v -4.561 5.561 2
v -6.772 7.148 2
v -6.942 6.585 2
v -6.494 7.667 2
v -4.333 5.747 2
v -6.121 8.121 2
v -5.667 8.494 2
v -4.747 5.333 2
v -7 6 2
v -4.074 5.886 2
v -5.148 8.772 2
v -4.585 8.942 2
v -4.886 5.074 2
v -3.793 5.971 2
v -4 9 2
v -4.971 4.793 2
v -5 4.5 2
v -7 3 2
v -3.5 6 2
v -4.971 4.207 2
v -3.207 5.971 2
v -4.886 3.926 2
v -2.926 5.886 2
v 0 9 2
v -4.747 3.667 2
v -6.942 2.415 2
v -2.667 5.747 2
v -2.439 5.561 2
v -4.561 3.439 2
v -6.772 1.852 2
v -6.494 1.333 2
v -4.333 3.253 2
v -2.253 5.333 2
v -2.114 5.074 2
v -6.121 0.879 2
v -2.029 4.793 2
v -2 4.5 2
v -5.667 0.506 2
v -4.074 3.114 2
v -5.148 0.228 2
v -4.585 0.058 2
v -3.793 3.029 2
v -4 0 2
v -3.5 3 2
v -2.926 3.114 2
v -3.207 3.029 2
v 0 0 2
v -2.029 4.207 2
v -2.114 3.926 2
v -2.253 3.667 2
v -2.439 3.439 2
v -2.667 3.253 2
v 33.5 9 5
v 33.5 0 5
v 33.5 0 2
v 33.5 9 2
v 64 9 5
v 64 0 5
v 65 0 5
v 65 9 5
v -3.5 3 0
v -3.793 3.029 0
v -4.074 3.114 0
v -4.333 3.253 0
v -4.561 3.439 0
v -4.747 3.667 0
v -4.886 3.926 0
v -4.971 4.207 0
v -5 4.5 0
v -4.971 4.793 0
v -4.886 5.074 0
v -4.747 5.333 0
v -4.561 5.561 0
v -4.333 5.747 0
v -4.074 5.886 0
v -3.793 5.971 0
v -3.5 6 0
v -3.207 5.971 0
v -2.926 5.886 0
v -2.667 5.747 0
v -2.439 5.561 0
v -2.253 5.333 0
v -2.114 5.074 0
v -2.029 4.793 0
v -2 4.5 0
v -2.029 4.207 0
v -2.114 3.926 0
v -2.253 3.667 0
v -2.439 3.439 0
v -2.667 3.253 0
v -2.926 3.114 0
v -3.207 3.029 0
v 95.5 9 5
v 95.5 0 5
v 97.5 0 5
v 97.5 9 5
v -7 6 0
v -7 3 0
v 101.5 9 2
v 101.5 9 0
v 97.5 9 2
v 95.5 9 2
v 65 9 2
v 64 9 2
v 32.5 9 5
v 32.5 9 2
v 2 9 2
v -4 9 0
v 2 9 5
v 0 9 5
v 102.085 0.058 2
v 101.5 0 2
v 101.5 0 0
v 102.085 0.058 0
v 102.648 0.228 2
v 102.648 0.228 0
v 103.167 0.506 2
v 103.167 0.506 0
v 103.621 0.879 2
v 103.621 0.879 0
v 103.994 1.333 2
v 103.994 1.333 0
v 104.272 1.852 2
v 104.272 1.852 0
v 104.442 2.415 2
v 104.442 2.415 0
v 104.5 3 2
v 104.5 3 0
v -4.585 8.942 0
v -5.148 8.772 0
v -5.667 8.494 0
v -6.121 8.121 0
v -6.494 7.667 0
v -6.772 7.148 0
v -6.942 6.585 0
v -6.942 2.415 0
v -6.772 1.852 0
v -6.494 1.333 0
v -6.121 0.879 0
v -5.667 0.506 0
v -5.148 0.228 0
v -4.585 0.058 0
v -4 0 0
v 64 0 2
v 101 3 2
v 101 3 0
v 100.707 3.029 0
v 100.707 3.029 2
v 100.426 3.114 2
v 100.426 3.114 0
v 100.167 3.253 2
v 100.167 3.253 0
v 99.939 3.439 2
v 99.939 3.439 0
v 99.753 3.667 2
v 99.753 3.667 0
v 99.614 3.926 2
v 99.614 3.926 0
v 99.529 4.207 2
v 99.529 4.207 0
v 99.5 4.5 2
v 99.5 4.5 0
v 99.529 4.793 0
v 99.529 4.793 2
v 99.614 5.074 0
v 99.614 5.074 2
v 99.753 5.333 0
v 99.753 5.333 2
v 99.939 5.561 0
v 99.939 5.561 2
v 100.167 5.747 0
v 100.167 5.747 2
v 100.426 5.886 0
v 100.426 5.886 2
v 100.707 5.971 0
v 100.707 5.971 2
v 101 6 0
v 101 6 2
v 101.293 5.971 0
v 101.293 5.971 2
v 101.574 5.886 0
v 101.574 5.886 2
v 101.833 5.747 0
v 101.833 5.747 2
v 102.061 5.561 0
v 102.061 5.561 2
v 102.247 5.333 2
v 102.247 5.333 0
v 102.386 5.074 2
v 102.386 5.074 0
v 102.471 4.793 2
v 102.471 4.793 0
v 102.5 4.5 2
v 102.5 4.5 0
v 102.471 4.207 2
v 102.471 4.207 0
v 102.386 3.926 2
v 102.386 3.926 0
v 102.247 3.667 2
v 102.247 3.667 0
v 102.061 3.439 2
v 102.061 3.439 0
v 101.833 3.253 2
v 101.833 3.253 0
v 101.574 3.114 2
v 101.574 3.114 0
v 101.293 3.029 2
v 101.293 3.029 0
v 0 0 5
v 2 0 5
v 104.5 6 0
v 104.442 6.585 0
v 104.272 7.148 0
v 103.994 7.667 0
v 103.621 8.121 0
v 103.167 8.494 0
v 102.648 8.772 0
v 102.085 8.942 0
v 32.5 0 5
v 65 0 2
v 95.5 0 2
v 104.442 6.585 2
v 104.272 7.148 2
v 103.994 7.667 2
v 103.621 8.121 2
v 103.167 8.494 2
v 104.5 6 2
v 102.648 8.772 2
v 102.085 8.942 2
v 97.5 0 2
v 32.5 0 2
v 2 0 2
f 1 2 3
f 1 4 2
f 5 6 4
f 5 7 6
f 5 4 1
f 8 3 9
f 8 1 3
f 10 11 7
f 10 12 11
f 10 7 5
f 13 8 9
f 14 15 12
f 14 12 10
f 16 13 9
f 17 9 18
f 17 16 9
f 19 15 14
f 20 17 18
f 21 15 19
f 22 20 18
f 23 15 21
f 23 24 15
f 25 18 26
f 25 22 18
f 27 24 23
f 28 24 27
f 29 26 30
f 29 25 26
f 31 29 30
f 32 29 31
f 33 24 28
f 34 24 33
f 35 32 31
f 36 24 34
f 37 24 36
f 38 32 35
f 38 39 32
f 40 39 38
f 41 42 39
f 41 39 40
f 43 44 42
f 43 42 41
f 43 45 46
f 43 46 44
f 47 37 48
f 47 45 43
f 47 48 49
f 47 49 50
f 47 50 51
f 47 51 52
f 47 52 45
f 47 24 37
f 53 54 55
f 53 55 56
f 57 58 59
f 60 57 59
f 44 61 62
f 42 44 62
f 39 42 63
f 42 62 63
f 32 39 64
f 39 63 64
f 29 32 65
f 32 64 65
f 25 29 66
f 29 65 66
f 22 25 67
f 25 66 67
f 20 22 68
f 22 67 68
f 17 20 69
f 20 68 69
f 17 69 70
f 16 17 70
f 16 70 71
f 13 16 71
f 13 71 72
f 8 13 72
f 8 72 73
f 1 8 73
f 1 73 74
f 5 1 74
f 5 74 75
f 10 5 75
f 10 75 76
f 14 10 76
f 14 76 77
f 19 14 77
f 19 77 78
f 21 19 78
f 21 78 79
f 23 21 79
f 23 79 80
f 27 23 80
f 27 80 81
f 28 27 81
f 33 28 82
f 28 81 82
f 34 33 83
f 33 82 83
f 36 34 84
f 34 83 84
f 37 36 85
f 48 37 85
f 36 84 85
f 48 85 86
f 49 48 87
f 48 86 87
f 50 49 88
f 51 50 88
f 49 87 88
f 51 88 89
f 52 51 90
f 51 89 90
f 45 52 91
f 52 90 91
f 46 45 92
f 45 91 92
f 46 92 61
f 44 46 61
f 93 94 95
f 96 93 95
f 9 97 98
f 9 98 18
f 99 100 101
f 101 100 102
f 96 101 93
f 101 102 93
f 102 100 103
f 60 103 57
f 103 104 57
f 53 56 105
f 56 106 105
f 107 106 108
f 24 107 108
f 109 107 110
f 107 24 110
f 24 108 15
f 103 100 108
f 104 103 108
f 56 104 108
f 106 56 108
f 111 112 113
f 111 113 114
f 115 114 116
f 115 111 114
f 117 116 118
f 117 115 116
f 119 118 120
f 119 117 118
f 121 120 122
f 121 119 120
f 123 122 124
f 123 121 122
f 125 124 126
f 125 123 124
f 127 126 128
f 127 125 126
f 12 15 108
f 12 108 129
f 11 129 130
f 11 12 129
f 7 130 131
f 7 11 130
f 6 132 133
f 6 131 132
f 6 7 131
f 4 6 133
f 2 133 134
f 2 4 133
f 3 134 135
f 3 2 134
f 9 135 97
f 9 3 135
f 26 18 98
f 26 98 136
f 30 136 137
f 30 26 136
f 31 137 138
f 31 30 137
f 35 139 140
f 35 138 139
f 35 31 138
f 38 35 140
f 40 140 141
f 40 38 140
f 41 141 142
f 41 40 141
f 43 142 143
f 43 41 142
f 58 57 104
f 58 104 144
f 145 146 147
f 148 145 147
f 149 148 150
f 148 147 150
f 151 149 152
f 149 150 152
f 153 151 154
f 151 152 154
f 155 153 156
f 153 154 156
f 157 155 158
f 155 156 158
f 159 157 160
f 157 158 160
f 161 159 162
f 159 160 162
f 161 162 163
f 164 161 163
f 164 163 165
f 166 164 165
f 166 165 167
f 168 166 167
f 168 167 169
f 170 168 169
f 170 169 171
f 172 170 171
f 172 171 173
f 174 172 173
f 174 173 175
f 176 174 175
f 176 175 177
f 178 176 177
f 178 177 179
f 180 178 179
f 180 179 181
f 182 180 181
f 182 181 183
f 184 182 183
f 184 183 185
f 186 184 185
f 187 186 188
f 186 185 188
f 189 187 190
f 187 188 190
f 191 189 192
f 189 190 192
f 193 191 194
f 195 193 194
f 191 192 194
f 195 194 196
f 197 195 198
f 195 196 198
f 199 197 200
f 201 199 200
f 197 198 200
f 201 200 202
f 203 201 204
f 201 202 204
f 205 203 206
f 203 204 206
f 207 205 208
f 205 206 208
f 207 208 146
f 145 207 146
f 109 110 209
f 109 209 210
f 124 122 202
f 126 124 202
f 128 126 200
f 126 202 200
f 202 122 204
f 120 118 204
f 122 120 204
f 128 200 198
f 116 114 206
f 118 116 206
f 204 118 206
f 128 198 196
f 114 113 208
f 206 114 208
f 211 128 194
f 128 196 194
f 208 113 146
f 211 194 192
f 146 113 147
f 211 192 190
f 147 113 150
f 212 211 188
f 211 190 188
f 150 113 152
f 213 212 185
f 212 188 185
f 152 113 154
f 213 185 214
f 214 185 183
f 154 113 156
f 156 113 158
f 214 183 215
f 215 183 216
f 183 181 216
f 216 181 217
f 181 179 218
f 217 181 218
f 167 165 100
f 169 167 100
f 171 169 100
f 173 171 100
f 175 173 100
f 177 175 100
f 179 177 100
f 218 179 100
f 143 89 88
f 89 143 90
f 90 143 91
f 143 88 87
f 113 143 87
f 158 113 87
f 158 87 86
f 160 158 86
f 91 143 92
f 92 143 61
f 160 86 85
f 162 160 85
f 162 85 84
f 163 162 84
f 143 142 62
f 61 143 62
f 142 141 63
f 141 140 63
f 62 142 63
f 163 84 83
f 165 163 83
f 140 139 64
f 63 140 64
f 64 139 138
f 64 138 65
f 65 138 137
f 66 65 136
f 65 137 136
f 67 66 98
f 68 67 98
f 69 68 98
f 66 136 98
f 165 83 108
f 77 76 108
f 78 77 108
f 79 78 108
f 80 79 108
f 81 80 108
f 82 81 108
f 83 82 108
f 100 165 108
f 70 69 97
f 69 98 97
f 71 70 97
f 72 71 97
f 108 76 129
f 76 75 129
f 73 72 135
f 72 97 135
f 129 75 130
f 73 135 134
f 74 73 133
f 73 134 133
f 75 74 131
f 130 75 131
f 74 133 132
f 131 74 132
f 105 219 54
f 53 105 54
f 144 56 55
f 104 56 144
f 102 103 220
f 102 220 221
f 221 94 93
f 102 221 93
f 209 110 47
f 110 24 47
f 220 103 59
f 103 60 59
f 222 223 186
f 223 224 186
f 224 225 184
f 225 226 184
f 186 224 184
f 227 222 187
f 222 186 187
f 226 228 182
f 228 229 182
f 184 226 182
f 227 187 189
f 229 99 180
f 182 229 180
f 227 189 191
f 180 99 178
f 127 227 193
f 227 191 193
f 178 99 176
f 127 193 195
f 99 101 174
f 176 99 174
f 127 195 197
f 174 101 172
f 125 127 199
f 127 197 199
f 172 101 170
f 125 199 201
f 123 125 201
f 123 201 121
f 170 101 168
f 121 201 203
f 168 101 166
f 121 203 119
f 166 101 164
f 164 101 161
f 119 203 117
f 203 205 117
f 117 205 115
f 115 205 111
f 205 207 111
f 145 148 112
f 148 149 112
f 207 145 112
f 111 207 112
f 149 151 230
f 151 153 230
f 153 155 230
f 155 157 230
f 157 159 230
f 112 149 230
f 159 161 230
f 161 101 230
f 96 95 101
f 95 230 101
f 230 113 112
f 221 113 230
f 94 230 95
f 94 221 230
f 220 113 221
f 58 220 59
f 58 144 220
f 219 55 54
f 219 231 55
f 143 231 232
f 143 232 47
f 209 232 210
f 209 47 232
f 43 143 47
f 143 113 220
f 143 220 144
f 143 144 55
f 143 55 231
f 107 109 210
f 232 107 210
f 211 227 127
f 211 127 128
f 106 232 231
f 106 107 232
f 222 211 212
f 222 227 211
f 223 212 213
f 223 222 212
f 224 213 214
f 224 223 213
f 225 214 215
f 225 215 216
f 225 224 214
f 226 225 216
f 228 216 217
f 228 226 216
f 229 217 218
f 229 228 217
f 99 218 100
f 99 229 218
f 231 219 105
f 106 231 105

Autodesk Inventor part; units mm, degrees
ref_plane "YZ Plane" through (0, 0, 0) normal (1, 0, 0) x (0, 1, 0)
ref_plane "XZ Plane" through (0, 0, 0) normal (0, 1, 0) x (-1, 0, 0)
ref_plane "XY Plane" through (0, 0, 0) normal (0, 0, 1) x (1, 0, 0)
sketch "Sketch1" plane through (0, 0, 0) normal (0, 0, 1) x (1, 0, 0)
  line L0 (0, 0) -> (97.5, 0)
  line L1 (97.5, 0) -> (97.5, 9)
  line L2 (97.5, 9) -> (0, 9)
  line L3 (0, 9) -> (0, 0)
  dimension "d2" = 97.5
  dimension "d3" = 9
extrude "Extrusion1" add sketch "Sketch1" along normal blind 5
sketch "Sketch2" plane through (0, 0, 5) normal (0, 0, 1) x (1, 0, 0)
  line L0 (0, 0) -> (97.5, 0) projected
  line L1 (97.5, 0) -> (97.5, 9) projected
  line L2 (0, 9) -> (0, 0) projected
  line L3 (2, 0) -> (32.5, 0)
  line L4 (32.5, 0) -> (32.5, 9)
  line L5 (32.5, 9) -> (2, 9)
  line L6 (2, 9) -> (2, 0)
  line L7 (33.5, 9) -> (64, 9)
  line L8 (64, 9) -> (64, 0)
  line L9 (64, 0) -> (33.5, 0)
  line L10 (33.5, 0) -> (33.5, 9)
  line L11 (65, 0) -> (95.5, 0)
  line L12 (95.5, 0) -> (95.5, 9)
  line L13 (95.5, 9) -> (65, 9)
  line L14 (65, 9) -> (65, 0)
  line L15 (97.5, 9) -> (0, 9) projected
  dimension "d5" = 30.5
  dimension "d6" = 2
  dimension "d7" = 2
  dimension "d8" = 30.5
  dimension "d9" = 30.5
  dimension "d10" = 1
extrude "Extrusion2" cut sketch "Sketch2" against normal blind 3 contours L6 L5 L4 L0 | L10 L7 L8 L0 | L14 L13 L12 L0
sketch "Sketch3" plane through (0, 0, 0) normal (-1, 0, 0) x (0, 0, 1)
  line L0 (0, 9) -> (0, 0) projected
  line L1 (0, 0) -> (5, 0) projected
  line L2 (0, 9) -> (2, 9)
  line L3 (2, 9) -> (2, 0)
  line L4 (2, 0) -> (0, 0)
  line L5 (0, 0) -> (0, 9)
  dimension "d13" = 2
extrude "Extrusion3" add sketch "Sketch3" along normal blind 7
sketch "Sketch5" plane through (97.5, 0, 0) normal (1, 0, 0) x (0, 0, -1)
  line L0 (0, 0) -> (-5, 0) projected
  line L1 (0, 9) -> (-2, 9)
  line L2 (-2, 9) -> (-2, 0)
  line L3 (-2, 0) -> (0, 0)
  line L4 (0, 0) -> (0, 9)
  dimension "d22" = 2
extrude "Extrusion5" add sketch "Sketch5" along normal blind 7
sketch "Sketch7" plane through (0, 0, 2) normal (0, 0, 1) x (1, 0, 0)
  line L0 (-7, 0) -> (-7, 9) projected
  line L1 (0, 0) -> (-7, 0) projected
  line L2 (97.5, 0) -> (97.5, 9) projected
  line L3 (97.5, 0) -> (104.5, 0) projected
  line L4 (104.5, 9) -> (104.5, 0) projected
  line L5 (97.5, 9) -> (104.5, 9) projected
  point P0 (-3.5, 4.5)
  point P1 (101, 4.5)
  dimension "d31" = 3.5
  dimension "d32" = 4.5
  dimension "d33" = 4.5
  dimension "d34" = 3.5
hole "Hole1" at (-3.5, 4.5, 2) at (101, 4.5, 2) direction (0, 0, -1) diameter 3 end through all
ref_plane "Work Plane1" through (33.5, 4.5, 2) normal (0, -1, 0) x (1, 0, 0)
fillet "Fillet1" radius 3 4 edges at (104.5, 0, 1) (104.5, 9, 1) (-7, 0, 1) (-7, 9, 1)
properties part number "base_corner" material "ABS Plastic"
